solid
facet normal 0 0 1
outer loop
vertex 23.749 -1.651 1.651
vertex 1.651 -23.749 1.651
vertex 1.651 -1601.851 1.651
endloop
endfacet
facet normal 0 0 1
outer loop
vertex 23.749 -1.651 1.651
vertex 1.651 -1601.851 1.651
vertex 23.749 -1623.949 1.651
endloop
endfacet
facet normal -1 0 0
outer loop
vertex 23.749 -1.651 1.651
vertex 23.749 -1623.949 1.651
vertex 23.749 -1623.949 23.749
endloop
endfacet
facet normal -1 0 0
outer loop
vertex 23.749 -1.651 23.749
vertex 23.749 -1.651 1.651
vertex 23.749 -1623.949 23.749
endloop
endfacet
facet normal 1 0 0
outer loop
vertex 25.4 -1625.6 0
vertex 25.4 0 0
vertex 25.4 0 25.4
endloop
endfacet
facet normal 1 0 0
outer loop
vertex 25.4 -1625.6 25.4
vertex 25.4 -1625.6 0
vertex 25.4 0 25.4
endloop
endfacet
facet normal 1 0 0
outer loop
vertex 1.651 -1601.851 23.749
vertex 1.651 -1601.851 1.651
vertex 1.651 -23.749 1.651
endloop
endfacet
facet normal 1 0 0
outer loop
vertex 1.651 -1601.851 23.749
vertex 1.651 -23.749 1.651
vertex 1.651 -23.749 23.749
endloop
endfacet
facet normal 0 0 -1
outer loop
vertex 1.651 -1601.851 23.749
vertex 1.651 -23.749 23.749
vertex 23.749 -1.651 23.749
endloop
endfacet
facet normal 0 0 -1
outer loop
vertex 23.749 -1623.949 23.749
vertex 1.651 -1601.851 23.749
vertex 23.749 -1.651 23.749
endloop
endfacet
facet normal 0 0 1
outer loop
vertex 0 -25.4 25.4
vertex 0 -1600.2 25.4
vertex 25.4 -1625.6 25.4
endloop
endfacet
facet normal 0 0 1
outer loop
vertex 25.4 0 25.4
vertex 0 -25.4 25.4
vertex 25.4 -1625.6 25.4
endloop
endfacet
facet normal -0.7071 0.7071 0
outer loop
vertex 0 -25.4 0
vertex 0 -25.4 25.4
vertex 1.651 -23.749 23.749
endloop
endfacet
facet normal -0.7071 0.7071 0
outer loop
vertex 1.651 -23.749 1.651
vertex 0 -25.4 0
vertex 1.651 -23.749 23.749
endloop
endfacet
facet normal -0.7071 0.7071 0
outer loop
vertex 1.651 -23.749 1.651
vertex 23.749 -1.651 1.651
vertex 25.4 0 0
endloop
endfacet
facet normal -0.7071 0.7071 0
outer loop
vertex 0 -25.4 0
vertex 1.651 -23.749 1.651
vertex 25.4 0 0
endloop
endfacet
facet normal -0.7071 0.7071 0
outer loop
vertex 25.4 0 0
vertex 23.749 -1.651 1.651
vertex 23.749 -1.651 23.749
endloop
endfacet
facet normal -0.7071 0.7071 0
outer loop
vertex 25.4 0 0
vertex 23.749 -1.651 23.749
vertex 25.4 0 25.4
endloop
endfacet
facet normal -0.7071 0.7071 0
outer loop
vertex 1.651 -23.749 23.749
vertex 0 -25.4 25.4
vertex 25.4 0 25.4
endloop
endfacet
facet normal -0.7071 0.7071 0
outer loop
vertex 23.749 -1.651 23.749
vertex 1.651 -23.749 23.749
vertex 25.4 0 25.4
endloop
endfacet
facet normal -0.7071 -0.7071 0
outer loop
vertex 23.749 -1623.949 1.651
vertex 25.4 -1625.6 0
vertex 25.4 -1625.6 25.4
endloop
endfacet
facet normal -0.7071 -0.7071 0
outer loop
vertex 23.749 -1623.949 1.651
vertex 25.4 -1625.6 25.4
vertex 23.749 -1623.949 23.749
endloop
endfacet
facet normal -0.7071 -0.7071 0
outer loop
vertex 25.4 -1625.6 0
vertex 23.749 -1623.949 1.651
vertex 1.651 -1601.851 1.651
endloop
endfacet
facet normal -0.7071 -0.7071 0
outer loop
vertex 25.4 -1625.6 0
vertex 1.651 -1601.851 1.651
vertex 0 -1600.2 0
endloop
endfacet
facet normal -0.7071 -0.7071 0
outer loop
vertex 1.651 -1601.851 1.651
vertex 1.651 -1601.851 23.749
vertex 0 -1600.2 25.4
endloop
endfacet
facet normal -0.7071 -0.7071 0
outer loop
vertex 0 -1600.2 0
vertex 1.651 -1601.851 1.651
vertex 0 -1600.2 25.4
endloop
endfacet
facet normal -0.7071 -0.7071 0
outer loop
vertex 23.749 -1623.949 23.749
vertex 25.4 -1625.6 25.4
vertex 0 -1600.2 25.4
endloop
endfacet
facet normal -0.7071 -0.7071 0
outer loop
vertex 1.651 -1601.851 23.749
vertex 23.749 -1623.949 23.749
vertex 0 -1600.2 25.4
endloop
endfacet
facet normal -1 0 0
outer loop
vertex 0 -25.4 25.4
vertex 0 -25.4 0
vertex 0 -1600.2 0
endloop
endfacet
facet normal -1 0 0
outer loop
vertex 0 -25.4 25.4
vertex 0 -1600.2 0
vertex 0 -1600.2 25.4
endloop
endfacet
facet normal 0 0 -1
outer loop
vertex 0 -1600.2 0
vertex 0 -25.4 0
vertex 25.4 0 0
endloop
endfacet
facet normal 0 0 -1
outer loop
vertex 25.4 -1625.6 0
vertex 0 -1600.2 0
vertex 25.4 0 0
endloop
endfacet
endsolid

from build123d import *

# Parameters (mm, degrees)
F0_W     = 25.4
F0_H     = 25.4
F0_W_2   = 22.098
F0_H_2   = 22.098
F1_DEPTH = 1625.6
F3_DEPTH = 25.401
F5_DEPTH = 25.401


with BuildPart() as f1:
    # F0 (on Front) → F1 (new body)
    with BuildSketch(Plane.XZ):
        with Locations((12.7, 12.7)):
            Rectangle(F0_W, F0_H)
        with Locations((12.7, 12.7)):
            Rectangle(F0_W_2, F0_H_2, mode=Mode.SUBTRACT)
    extrude(amount=F1_DEPTH)

    # F2 (on face) → F3 (cut, through all)
    with BuildSketch(Plane.XY.offset(25.4)):
        Polygon((0, -1625.6), (25.4, -1625.6), (0, -1600.2), align=None)
    extrude(amount=-F3_DEPTH, mode=Mode.SUBTRACT)

    # F4 (on face) → F5 (cut, through all)
    with BuildSketch(Plane.XY.offset(25.4)):
        Polygon((0, -25.4), (25.4, 0), (0, 0), align=None)
    extrude(amount=-F5_DEPTH, mode=Mode.SUBTRACT)


solid = f1.part
